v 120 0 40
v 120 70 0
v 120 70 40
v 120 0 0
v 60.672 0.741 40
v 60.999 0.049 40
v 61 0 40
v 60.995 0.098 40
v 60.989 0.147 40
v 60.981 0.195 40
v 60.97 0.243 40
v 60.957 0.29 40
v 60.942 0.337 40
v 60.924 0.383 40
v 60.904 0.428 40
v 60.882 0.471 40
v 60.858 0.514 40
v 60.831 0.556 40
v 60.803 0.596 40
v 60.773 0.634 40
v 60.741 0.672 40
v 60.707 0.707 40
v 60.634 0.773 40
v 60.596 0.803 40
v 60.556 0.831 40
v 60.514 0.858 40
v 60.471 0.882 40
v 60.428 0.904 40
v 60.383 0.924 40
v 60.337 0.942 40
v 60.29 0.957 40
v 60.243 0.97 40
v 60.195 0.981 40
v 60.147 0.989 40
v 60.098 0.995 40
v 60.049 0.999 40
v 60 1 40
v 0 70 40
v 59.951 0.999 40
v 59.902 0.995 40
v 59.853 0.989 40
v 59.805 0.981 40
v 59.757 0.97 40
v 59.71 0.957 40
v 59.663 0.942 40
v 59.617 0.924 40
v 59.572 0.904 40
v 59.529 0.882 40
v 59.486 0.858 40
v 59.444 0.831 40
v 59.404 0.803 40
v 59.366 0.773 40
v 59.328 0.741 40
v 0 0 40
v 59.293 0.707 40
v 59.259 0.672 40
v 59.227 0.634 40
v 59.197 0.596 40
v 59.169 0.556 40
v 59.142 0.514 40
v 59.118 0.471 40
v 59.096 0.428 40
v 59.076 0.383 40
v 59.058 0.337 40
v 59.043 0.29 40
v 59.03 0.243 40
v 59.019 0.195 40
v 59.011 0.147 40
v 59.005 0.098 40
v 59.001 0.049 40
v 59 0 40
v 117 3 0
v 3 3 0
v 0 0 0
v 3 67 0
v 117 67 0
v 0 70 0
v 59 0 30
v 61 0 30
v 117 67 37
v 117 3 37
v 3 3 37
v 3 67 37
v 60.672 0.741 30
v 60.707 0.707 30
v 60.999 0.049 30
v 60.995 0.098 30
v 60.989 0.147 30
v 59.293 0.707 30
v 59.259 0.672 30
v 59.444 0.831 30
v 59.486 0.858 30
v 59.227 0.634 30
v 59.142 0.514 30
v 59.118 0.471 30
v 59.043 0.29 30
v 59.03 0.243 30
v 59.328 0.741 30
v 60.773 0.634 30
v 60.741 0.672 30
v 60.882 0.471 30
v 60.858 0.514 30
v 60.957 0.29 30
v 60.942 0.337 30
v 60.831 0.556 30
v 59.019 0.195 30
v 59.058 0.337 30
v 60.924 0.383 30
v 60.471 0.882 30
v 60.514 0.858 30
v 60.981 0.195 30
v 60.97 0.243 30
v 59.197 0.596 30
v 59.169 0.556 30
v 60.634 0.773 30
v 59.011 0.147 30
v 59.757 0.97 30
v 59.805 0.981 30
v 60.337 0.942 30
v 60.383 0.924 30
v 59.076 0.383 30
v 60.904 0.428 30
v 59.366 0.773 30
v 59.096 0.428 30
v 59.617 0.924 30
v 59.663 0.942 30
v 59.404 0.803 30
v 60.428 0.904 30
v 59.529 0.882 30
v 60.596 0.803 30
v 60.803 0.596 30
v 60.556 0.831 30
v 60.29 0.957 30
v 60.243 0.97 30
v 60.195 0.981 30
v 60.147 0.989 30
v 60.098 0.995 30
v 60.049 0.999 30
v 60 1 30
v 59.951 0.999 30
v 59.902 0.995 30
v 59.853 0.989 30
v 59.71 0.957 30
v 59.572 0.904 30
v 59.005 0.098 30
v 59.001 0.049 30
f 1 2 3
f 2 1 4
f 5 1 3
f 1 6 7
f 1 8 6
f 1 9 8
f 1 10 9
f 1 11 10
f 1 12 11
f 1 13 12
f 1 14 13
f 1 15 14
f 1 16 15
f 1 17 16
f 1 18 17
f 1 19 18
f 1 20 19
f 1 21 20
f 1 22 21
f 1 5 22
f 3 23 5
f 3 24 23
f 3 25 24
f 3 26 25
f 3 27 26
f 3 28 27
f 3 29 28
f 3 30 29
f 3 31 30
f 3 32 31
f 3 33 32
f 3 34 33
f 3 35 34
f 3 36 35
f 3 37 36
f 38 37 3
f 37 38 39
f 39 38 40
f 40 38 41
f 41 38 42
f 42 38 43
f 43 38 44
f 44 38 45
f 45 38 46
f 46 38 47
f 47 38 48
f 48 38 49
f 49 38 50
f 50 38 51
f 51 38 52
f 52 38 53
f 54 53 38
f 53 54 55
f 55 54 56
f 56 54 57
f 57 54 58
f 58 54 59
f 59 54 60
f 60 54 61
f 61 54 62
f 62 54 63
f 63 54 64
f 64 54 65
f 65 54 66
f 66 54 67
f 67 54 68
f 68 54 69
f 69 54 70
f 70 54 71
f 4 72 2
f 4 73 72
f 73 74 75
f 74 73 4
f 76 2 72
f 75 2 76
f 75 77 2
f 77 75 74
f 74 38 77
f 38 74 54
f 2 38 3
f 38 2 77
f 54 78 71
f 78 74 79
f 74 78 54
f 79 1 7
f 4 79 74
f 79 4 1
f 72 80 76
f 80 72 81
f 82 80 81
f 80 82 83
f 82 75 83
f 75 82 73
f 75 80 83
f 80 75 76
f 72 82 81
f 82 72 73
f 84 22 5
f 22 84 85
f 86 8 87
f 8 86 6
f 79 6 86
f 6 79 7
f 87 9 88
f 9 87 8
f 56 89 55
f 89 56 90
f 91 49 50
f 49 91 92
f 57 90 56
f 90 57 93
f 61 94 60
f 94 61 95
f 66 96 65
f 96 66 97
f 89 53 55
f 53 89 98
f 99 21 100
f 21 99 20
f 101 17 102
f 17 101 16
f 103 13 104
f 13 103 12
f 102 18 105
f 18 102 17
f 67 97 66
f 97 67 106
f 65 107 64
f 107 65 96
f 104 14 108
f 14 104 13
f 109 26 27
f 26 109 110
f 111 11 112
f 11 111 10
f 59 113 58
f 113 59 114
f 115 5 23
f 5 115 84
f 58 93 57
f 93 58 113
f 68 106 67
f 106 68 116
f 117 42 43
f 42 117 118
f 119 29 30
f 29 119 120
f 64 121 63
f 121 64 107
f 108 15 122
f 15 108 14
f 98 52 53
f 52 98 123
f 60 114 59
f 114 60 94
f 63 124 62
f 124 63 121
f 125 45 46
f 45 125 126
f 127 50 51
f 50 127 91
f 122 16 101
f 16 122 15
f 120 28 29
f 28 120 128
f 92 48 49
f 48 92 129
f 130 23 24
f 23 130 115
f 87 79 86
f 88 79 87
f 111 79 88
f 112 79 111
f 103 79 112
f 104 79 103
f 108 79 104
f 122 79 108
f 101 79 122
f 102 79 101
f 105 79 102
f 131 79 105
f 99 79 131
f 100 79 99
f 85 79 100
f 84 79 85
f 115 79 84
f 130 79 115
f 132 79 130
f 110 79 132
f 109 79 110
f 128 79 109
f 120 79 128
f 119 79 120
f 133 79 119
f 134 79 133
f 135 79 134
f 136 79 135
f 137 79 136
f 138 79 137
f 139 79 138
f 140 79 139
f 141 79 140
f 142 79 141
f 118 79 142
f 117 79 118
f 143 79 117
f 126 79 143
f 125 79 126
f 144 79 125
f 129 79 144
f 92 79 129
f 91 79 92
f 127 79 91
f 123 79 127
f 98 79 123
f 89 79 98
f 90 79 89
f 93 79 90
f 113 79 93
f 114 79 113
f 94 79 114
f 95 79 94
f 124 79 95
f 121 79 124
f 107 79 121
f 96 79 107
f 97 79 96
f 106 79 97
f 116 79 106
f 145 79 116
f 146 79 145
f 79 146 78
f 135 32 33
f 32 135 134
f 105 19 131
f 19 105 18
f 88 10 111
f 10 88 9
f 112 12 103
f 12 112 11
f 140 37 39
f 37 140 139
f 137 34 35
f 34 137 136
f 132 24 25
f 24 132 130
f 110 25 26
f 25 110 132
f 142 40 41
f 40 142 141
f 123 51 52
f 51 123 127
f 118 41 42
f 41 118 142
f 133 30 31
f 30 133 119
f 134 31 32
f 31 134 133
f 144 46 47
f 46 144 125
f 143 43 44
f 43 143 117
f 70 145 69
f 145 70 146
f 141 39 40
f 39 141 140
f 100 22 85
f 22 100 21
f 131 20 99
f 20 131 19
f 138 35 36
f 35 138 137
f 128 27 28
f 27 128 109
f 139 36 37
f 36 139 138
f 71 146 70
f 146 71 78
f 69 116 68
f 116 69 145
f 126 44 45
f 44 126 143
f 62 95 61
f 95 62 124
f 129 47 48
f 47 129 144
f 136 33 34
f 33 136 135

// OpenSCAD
// Buffer Tank for Mini Horizontal Gel Electrophoresis
// Units: millimetres

// Outer Dimensions
$outer_x = 120;
$outer_y = 70;
$outer_z = 40;

// Wall and Floor Thickness
$wall_thick = 3;
$floor_thick = 3;

// Platform Dimensions
$platform_x = 60;
$platform_y = $outer_y; // Spans full outer width
$platform_height = 10;  // Height above inner floor
$platform_z_top = $floor_thick + $platform_height; // 3 + 10 = 13

// Hole Dimensions
$hole_diameter = 2;
$hole_y = 0;
$hole_z = 30;

// Configuration
$fn = 128; // High resolution for smooth curves and accurate hole sizing

// Derived Dimensions
$inner_x = $outer_x - 2 * $wall_thick; // 114
$inner_y = $outer_y - 2 * $wall_thick; // 64
$inner_z = $outer_z - $wall_thick;     // 37 (Top of floor/walls)

// Start building the tank
difference() {
    // 1. Create the main outer block
    cube([
        $outer_x, 
        $outer_y, 
        $outer_z
    ]);

    // 2. Cut out the inner volume (walls and floor)
    // We subtract a block that is the size of the inner cavity
    translate([
        $wall_thick, 
        $wall_thick, 
        0
    ]) {
        cube([
            $inner_x, 
            $inner_y, 
            $inner_z
        ]);
    }

    // 3. Cut out the platform from the bottom chamber
    // The platform sits on the floor (z=0) and goes up to $platform_z_top (13)
    // It spans the full width ($outer_y) and is centered in X
    // Note: The platform is solid, so we cut it out of the tank volume.
    // It extends from the inner wall to the outer wall? 
    // Specification: "spans the full inner width".
    // Inner width is $inner_y. Centered in Y means from ($outer_y - $inner_y)/2 = 3mm offset.
    translate([
        ($outer_x - $platform_x) / 2, 
        $wall_thick, // Start from inner wall (y = 3)
        0
    ]) {
        cube([
            $platform_x, 
            $inner_y, 
            $platform_z_top
        ]);
    }

    // 4. Drill holes for electrodes
    // Position: y = 0 (center of tank width), z = 30
    // The hole goes through the wall along the X axis.
    // We need to drill from the outside face (x = $outer_x/2) to the inside.
    // Since we are in a difference block, we place cylinders at the hole location.
    
    // Left Hole (at x = -outer_x/2)
    translate([
        -$outer_x / 2, 
        $hole_y, 
        $hole_z
    ]) {
        cylinder(
            h = $outer_x, // Long enough to go through the whole tank
            r = $hole_diameter / 2,
            $fn = $fn
        );
    }

    // Right Hole (at x = +outer_x/2)
    translate([
        $outer_x / 2, 
        $hole_y, 
        $hole_z
    ]) {
        cylinder(
            h = $outer_x,
            r = $hole_diameter / 2,
            $fn = $fn
        );
    }
}
